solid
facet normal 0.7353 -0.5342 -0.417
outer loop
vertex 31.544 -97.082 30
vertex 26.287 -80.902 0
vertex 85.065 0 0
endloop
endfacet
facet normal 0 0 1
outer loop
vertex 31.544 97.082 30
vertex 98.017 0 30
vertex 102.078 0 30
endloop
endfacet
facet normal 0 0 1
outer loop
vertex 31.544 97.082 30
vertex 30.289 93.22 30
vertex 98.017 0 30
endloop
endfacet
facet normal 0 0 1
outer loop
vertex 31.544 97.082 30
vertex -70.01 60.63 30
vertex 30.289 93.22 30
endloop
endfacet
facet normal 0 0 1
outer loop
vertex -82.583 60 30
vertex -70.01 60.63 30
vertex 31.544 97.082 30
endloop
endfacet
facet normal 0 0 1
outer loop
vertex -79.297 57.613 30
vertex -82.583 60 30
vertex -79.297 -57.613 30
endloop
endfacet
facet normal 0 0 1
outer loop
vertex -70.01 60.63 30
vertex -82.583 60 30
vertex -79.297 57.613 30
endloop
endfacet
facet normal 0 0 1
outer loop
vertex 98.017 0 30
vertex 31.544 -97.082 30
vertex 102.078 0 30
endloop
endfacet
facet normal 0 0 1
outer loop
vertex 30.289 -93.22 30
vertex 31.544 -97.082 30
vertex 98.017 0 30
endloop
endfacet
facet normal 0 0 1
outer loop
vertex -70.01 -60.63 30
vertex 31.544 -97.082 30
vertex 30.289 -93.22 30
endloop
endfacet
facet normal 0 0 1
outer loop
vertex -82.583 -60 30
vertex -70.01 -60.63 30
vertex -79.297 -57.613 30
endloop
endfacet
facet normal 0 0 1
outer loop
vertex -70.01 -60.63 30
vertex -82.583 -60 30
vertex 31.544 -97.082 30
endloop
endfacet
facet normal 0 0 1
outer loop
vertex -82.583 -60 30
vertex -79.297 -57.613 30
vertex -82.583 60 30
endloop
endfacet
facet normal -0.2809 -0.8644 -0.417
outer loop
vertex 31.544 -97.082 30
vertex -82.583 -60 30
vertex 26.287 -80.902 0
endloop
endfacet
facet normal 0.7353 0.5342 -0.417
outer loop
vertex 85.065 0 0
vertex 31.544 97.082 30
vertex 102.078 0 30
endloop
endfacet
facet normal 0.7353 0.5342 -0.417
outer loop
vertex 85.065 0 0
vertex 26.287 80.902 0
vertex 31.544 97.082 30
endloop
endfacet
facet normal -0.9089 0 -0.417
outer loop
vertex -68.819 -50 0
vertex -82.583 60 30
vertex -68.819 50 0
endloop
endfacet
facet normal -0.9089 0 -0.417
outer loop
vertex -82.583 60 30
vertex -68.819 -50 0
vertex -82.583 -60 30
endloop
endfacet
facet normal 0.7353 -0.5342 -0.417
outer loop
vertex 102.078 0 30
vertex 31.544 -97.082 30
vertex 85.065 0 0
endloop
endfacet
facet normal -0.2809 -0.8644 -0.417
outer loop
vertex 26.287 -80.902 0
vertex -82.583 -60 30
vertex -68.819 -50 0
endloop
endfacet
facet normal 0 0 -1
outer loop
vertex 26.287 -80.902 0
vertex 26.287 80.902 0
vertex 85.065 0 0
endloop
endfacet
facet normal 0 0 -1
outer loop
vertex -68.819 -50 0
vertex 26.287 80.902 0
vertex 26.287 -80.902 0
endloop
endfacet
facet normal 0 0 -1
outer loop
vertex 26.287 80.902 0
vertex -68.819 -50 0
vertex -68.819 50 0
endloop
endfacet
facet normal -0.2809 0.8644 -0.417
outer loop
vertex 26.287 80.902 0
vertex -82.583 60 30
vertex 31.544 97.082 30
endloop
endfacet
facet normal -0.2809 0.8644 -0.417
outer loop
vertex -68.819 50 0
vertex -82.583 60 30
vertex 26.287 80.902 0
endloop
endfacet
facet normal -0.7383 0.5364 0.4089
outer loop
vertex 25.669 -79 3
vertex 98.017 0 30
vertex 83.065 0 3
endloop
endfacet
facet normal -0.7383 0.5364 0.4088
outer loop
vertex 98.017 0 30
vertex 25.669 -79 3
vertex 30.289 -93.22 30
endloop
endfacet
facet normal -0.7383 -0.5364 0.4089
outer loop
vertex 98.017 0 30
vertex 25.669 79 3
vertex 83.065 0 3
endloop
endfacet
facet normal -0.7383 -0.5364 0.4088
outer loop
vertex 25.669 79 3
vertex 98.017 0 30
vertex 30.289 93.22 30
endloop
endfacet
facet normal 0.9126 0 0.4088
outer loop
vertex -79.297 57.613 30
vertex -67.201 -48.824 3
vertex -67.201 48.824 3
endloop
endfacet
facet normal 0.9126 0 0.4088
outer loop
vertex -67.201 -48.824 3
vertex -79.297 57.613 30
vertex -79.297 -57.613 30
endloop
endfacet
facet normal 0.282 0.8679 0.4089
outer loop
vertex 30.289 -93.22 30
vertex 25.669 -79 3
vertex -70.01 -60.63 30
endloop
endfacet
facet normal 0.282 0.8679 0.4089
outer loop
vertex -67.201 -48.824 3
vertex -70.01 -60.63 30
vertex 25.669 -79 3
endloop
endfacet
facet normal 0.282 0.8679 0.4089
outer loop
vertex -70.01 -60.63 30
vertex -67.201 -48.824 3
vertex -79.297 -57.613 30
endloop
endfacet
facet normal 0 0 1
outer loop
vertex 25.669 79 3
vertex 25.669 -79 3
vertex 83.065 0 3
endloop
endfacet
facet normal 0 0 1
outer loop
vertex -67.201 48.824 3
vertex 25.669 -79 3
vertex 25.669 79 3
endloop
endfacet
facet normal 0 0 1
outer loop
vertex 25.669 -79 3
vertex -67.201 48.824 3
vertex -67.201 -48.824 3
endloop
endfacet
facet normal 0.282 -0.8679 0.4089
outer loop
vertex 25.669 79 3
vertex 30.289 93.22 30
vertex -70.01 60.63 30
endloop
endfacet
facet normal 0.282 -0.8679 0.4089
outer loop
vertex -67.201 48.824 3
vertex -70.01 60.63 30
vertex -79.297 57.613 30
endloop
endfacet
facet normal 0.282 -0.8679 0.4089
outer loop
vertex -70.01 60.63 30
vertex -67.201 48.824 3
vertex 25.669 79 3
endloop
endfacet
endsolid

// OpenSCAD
// Drip catcher for one of those small pentagonal terraria that are all the rage in kitch stores.
// Sorry, I don't have any more identifying information.

// By: Drmn4ea (drmn4ea at gmail)
// License: Creative Commons CC0 (or public domain to the extent permitted by law)

// I printed this on an STL printer using a 'flex' resin, which allowed it to be squished slightly for
// insertion into the terrarium.

sidelength = 100; // length on each side in mm
height = 30;
ratio = 1.2;

// calculations

r = sidelength / (2*sin(180/5));

difference()
{
    cylinder(height,r,r*ratio,$fn=5);

    translate([0, 0, 3])
    {
        cylinder(height,r-2,(r-2)*ratio,$fn=5);
    }
}
